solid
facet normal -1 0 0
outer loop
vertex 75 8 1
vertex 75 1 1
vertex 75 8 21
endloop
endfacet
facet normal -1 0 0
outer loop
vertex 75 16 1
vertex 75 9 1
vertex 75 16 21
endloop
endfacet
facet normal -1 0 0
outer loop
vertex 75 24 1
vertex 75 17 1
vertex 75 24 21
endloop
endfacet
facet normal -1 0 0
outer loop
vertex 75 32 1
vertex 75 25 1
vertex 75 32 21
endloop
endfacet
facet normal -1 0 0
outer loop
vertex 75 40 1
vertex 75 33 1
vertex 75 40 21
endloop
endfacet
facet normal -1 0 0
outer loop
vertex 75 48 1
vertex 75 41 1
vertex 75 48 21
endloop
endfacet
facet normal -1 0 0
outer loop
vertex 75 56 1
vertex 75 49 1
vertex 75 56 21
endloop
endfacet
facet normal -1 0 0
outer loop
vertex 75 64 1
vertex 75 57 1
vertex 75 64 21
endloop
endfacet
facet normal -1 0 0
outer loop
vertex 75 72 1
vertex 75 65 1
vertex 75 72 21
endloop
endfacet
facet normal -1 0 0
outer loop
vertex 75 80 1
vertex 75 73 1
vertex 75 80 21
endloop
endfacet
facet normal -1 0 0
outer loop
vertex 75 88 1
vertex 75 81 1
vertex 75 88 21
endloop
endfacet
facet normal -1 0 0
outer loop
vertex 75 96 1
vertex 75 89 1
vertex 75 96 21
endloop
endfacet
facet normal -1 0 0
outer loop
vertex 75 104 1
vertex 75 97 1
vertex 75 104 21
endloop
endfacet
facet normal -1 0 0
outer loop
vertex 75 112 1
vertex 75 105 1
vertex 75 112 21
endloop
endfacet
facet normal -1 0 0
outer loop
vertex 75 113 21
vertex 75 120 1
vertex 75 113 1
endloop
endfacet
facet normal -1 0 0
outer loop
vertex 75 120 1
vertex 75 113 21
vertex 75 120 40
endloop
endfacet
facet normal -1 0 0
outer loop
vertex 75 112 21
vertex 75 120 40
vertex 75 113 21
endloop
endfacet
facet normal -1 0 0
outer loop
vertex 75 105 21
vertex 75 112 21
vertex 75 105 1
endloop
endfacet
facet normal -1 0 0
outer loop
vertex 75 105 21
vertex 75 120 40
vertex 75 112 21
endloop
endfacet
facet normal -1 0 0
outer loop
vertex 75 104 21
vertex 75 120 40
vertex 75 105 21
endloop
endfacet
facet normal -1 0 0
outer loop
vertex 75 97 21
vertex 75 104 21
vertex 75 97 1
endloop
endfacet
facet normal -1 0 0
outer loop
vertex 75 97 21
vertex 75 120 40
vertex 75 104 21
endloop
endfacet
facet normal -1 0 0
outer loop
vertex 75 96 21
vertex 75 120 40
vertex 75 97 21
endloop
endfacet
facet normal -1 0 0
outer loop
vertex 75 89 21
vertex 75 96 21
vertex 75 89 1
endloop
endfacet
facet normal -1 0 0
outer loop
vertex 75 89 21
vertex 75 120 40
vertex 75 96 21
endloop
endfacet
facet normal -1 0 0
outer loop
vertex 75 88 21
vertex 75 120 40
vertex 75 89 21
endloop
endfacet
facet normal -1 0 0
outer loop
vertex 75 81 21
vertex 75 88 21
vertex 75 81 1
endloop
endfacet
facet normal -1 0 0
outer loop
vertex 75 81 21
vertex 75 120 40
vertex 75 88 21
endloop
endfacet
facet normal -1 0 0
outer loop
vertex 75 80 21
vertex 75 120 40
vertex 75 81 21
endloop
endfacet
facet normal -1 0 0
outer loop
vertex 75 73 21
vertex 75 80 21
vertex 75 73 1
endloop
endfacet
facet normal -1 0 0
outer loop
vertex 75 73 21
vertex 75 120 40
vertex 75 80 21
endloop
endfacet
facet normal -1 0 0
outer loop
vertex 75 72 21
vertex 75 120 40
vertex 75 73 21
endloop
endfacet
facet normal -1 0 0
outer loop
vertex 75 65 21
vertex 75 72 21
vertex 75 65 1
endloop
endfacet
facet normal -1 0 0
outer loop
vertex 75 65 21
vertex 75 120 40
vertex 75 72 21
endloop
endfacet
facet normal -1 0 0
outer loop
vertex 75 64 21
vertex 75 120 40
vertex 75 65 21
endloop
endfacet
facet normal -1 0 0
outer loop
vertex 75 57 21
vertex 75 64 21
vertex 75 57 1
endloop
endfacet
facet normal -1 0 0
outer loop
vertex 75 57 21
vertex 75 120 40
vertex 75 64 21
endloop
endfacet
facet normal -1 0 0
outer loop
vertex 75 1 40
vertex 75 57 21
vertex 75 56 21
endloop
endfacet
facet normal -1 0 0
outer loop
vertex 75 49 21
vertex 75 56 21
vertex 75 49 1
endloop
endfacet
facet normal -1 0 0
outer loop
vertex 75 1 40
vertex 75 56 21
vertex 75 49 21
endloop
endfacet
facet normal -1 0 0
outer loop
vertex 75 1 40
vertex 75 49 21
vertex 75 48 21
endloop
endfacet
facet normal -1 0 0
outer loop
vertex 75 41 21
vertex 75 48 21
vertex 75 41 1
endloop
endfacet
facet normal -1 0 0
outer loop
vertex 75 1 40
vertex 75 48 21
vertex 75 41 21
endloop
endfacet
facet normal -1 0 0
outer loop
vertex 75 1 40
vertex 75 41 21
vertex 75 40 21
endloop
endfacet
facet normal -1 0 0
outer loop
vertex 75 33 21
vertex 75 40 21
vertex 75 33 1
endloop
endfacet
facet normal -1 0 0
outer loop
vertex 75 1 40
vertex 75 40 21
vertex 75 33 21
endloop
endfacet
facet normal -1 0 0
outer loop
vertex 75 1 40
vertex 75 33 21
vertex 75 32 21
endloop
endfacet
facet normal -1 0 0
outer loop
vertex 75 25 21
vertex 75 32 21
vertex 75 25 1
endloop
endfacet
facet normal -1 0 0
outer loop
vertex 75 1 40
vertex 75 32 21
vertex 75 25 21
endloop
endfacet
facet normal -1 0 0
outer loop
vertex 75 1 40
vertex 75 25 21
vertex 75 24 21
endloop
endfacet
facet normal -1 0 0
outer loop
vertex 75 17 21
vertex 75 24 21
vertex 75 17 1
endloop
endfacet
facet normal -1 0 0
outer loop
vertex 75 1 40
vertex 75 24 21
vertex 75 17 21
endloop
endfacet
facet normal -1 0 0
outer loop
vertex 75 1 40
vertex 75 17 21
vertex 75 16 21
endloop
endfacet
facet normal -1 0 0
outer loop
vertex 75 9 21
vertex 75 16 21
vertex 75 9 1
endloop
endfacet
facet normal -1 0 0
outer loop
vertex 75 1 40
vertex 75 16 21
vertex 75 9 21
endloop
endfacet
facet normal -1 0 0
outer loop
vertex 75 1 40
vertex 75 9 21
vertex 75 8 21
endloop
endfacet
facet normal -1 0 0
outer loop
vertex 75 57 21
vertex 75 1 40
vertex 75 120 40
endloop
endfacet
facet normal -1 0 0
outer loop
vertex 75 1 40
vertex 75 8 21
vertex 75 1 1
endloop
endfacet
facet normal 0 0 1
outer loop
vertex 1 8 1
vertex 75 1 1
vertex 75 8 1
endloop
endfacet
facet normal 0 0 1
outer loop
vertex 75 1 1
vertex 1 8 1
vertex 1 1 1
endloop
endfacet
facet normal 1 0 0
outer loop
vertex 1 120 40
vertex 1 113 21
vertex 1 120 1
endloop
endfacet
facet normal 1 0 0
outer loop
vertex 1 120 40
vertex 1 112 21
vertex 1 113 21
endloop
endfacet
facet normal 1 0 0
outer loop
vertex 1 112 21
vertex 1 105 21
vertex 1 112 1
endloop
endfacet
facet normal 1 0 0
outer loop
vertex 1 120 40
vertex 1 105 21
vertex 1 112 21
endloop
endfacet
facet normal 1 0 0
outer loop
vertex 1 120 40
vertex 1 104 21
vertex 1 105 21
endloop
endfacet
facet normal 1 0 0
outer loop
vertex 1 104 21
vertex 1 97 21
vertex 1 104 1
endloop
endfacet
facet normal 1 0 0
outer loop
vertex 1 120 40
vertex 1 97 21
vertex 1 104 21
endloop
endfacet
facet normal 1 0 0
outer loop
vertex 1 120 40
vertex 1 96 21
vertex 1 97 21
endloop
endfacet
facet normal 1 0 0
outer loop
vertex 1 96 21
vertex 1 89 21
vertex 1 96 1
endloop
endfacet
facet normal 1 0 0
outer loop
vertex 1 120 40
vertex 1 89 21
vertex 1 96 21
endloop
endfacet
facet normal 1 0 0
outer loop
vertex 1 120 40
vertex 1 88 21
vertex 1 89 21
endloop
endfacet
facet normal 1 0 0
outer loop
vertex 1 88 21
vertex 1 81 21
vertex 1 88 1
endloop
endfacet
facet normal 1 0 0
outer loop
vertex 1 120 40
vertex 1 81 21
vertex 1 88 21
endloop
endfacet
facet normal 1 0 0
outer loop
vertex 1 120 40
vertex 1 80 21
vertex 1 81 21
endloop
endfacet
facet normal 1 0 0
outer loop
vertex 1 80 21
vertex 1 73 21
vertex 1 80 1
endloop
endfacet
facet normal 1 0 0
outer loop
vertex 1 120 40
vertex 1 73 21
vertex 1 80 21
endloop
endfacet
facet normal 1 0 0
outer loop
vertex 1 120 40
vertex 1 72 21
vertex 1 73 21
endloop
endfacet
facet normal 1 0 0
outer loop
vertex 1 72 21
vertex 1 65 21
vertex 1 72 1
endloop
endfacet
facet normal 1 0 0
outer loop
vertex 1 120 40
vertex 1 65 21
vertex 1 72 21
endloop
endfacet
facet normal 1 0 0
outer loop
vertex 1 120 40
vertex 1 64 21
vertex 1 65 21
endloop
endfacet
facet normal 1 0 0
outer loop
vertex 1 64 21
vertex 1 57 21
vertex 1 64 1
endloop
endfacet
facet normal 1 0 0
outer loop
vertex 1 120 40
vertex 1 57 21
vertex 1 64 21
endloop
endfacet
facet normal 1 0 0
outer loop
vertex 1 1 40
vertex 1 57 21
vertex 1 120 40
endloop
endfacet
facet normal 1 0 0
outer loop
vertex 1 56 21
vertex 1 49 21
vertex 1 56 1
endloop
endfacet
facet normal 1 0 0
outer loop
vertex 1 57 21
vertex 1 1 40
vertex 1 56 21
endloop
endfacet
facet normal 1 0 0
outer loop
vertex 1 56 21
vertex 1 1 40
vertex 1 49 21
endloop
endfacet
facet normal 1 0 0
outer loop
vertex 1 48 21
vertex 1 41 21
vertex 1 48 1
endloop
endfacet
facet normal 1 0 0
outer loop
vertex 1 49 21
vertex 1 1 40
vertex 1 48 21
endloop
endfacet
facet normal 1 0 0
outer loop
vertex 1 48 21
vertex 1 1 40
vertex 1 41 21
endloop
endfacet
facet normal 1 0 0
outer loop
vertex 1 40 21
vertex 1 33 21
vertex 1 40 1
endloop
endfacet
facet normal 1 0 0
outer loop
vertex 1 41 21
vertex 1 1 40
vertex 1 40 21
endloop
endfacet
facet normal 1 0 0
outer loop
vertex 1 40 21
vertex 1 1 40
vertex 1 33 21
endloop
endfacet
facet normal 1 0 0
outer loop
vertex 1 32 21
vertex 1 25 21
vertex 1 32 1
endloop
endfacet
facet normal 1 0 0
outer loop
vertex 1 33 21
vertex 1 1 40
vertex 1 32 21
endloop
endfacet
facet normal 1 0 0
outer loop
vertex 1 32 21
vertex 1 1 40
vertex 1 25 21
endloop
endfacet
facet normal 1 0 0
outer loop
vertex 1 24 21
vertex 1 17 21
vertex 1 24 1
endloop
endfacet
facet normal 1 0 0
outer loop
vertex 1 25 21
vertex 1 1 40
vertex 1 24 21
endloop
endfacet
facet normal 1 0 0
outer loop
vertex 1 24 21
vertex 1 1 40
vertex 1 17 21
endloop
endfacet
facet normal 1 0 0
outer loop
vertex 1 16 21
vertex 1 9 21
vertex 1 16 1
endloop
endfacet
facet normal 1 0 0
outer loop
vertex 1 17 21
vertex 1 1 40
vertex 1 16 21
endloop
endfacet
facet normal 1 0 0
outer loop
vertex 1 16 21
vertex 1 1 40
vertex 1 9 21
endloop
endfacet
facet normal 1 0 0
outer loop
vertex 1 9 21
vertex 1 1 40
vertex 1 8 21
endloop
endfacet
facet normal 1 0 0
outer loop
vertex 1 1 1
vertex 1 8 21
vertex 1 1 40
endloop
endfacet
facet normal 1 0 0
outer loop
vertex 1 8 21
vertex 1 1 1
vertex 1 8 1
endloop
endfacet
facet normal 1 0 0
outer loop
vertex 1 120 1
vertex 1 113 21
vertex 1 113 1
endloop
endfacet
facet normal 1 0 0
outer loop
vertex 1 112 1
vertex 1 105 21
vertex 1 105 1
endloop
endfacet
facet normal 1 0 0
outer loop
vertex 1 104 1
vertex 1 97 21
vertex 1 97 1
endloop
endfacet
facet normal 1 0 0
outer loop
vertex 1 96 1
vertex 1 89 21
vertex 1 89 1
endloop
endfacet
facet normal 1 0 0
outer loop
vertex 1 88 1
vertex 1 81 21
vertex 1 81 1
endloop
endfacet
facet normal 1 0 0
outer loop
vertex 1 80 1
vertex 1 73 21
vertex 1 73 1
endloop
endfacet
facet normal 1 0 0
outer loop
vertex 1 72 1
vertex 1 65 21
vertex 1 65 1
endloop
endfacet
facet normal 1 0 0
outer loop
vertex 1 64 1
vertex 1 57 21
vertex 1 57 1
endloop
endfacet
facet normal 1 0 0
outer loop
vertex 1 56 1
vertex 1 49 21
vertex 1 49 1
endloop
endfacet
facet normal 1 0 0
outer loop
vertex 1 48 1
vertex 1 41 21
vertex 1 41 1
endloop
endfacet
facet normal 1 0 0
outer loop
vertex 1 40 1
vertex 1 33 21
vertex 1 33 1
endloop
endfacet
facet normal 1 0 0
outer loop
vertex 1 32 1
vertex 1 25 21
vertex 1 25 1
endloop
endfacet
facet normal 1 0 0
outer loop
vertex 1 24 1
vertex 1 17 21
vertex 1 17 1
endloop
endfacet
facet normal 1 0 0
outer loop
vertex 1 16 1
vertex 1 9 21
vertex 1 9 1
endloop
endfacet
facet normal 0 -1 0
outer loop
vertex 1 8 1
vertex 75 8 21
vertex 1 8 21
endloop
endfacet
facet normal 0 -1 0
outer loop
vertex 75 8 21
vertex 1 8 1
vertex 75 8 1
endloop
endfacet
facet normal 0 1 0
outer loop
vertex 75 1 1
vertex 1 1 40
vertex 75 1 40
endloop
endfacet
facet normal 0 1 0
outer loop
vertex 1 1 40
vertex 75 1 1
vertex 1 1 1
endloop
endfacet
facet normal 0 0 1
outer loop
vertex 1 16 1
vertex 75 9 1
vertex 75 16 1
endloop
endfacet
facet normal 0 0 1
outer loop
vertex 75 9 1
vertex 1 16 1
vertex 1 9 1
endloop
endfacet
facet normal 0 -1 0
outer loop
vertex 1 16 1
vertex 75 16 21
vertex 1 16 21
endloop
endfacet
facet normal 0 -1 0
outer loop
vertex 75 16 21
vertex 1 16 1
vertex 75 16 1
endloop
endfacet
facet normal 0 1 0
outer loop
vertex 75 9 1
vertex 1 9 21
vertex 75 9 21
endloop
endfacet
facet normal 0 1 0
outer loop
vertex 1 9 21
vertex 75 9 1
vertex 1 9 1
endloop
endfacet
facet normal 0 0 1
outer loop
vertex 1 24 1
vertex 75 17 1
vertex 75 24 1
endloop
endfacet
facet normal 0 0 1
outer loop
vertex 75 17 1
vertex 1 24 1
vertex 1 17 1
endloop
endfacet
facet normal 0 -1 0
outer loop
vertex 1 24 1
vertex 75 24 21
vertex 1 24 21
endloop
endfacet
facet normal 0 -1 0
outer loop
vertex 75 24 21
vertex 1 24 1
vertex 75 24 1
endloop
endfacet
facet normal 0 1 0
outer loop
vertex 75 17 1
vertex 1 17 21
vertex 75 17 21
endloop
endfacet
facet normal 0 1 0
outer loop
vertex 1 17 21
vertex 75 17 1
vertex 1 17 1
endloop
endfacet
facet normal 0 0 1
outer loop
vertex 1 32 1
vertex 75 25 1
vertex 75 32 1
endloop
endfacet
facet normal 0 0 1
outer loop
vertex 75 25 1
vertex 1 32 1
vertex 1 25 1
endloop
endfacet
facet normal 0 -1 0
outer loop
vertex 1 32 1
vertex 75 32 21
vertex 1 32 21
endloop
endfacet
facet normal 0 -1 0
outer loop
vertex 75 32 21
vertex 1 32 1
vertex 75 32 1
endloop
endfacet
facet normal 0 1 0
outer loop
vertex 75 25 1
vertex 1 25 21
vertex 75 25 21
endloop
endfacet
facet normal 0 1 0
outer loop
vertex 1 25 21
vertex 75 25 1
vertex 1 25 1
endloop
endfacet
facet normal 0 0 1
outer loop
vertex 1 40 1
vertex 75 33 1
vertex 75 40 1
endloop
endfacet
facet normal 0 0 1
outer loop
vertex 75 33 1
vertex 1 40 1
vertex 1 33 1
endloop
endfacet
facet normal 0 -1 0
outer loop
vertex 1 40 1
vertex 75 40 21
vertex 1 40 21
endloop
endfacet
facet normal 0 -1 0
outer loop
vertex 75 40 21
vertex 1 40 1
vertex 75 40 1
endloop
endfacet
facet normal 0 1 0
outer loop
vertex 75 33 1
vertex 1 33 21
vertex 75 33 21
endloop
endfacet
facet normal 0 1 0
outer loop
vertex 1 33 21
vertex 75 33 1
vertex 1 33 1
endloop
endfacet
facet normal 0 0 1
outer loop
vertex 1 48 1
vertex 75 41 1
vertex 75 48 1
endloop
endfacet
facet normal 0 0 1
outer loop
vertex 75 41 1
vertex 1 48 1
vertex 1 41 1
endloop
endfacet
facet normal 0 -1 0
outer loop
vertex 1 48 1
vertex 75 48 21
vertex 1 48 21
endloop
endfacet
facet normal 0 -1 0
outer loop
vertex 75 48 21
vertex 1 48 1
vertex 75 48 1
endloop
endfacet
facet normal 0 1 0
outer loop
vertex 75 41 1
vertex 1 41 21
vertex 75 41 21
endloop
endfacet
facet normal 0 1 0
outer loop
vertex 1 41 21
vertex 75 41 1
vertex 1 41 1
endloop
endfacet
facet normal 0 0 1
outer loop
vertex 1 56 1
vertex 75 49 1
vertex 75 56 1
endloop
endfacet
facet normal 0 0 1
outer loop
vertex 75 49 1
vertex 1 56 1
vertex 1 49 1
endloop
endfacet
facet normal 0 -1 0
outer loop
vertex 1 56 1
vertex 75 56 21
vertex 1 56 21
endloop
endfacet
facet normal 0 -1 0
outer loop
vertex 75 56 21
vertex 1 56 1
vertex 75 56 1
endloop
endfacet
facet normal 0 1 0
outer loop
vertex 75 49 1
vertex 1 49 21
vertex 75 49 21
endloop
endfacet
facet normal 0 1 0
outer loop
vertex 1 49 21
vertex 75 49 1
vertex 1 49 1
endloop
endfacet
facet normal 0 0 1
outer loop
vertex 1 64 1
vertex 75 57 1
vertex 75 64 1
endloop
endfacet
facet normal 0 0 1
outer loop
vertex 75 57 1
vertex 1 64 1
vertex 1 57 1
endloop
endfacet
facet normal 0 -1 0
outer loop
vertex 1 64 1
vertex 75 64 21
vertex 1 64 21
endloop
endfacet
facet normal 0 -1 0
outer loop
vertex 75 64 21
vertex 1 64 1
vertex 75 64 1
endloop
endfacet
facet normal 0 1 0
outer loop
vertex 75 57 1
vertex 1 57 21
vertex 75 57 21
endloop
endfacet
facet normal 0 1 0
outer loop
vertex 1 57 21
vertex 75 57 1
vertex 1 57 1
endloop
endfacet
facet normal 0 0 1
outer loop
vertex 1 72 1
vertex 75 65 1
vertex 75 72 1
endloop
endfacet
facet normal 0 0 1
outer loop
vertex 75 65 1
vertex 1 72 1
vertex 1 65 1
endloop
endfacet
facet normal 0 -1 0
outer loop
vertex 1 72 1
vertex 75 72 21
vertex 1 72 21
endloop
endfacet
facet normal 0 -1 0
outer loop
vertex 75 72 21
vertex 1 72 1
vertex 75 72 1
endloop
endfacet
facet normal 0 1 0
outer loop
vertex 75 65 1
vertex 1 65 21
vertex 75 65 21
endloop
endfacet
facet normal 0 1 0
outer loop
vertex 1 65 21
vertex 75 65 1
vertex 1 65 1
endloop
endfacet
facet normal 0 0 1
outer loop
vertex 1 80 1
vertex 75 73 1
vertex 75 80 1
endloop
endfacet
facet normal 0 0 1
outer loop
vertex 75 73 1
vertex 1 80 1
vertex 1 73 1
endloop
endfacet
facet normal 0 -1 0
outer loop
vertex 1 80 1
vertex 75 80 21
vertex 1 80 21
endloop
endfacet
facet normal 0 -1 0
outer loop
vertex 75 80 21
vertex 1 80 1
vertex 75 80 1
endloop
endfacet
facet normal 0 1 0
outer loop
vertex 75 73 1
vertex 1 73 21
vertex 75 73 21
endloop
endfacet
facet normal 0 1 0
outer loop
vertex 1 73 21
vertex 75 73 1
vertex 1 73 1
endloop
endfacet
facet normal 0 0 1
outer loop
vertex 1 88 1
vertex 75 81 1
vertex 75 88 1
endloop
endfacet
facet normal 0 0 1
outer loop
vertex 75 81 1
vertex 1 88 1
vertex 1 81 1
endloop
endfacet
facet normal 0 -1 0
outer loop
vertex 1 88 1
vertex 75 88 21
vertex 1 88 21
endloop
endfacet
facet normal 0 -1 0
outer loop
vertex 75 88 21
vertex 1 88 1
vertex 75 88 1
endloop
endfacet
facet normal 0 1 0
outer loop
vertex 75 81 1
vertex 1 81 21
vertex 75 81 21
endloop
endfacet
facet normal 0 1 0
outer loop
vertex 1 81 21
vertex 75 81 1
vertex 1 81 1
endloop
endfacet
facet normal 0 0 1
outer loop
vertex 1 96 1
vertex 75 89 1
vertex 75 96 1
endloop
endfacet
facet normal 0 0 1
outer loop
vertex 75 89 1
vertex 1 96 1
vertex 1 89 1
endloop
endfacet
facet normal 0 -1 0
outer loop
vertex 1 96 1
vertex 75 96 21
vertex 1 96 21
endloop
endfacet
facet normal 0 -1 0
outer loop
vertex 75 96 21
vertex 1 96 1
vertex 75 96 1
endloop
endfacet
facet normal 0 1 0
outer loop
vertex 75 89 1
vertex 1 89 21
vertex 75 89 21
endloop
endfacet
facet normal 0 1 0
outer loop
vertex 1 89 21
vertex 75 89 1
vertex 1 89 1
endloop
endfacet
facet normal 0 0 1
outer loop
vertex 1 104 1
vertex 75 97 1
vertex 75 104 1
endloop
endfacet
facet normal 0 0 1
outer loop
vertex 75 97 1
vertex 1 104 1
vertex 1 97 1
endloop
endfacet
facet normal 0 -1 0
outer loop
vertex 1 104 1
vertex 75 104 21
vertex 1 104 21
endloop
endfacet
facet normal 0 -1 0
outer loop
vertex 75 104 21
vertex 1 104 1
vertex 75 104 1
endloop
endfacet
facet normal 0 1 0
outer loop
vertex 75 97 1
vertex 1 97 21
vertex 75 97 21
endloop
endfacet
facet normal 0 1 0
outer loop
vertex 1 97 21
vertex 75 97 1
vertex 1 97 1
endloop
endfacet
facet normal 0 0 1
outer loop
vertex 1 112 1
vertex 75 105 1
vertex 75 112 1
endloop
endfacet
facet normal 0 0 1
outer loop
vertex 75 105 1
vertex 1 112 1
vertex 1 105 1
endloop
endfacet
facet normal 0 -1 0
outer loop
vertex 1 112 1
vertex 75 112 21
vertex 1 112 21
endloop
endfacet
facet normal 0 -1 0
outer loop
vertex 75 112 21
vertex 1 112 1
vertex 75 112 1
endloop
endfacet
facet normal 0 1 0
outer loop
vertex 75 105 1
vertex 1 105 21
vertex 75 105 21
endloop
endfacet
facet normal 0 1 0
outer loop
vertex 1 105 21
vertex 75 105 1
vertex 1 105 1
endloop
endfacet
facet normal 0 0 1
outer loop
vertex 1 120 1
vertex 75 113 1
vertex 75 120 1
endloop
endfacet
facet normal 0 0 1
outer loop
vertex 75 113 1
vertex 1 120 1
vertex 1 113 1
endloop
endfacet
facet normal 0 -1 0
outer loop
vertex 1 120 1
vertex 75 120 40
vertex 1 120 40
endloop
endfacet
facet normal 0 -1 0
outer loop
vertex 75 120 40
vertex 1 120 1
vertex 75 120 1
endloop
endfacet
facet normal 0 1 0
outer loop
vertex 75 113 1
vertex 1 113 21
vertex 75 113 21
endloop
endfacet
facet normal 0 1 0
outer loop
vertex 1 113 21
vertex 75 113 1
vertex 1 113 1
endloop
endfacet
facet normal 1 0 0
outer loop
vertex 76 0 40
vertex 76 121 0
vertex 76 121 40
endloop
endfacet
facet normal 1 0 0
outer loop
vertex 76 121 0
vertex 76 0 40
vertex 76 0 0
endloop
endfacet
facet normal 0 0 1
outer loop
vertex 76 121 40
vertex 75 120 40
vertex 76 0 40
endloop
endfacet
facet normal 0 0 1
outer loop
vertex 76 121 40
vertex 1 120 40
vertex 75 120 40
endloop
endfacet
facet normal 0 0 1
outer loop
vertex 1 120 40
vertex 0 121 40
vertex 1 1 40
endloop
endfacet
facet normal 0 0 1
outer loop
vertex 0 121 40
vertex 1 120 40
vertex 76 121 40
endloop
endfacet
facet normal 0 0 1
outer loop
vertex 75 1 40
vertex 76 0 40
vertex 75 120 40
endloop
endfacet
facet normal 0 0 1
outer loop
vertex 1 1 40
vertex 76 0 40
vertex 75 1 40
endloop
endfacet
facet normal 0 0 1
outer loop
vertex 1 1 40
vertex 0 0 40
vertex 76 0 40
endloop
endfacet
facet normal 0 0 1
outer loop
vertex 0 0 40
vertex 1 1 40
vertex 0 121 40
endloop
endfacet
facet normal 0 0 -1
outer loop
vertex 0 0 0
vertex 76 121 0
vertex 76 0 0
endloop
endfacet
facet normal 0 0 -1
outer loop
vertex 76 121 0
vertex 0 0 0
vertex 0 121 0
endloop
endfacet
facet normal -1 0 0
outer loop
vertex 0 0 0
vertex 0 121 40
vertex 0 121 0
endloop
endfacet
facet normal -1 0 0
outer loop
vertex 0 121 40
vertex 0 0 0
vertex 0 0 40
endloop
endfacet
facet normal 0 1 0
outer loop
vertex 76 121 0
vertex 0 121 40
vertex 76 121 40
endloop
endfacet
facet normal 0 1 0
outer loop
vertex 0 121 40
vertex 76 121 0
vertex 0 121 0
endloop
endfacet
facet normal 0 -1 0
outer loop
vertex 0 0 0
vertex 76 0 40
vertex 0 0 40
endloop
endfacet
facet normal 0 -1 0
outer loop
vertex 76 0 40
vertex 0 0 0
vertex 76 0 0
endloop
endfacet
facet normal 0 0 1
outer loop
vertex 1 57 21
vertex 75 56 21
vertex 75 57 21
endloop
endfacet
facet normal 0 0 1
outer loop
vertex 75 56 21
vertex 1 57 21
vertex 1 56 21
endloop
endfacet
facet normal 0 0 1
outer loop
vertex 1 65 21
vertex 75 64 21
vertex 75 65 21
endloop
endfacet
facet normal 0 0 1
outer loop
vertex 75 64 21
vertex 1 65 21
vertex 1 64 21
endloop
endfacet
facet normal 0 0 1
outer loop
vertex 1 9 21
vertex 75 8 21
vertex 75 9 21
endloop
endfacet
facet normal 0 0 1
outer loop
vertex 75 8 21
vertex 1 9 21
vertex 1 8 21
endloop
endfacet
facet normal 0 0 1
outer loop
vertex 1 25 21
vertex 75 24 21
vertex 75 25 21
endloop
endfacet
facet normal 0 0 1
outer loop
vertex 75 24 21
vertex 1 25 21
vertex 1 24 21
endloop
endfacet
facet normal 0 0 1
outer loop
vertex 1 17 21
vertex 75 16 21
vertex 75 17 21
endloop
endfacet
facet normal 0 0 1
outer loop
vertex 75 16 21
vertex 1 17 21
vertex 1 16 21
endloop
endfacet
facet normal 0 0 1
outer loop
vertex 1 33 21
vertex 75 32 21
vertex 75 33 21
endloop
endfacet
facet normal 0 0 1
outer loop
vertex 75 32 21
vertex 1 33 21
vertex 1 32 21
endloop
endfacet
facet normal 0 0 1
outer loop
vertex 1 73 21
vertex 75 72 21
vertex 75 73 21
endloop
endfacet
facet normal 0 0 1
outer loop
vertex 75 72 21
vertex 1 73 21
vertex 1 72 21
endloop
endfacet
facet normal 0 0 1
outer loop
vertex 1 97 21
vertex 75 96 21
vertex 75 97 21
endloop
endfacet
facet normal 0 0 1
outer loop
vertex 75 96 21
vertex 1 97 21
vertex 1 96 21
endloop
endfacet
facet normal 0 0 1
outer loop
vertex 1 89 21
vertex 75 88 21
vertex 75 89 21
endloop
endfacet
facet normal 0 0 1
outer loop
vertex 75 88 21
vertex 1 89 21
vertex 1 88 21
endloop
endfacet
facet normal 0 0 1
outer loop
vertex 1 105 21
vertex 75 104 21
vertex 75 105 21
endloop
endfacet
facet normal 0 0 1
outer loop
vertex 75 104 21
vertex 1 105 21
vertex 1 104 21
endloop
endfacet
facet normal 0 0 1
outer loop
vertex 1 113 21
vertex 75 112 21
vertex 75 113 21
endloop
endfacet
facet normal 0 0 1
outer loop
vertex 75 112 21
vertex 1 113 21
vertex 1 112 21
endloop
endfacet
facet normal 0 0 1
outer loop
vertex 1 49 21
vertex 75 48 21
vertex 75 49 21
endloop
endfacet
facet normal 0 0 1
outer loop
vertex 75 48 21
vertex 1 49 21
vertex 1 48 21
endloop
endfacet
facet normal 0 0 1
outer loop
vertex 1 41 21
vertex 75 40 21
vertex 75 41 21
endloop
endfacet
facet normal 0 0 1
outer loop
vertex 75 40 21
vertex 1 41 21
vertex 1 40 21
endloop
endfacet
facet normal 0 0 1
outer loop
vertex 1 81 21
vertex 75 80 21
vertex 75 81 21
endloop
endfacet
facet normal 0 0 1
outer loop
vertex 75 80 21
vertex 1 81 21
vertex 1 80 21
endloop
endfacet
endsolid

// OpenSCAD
$fn=200;

THICK = 1;

BOX_W = 74;
BOX_L = 119; //320;
BOX_H = 40;

TILE_L = 7;

difference() {
    cube(size = [
        BOX_W + (THICK * 2),
        BOX_L + (THICK * 2), 
        BOX_H]);

    translate([
        THICK, 
        THICK, 
        THICK + 20]) {
            
        cube(size = [
            BOX_W,
            BOX_L,
            BOX_H - 20]);
    }

    for (i = [THICK : 8 : THICK + (8 * 14)] ) {
        tile_slot(i);
    }

    // tile_slot(2);
    // tile_slot(9);
}


module tile_slot(y) {
    translate([THICK, y, THICK])
        cube(size = [
            BOX_W,
            TILE_L, 
            BOX_H]);
}
